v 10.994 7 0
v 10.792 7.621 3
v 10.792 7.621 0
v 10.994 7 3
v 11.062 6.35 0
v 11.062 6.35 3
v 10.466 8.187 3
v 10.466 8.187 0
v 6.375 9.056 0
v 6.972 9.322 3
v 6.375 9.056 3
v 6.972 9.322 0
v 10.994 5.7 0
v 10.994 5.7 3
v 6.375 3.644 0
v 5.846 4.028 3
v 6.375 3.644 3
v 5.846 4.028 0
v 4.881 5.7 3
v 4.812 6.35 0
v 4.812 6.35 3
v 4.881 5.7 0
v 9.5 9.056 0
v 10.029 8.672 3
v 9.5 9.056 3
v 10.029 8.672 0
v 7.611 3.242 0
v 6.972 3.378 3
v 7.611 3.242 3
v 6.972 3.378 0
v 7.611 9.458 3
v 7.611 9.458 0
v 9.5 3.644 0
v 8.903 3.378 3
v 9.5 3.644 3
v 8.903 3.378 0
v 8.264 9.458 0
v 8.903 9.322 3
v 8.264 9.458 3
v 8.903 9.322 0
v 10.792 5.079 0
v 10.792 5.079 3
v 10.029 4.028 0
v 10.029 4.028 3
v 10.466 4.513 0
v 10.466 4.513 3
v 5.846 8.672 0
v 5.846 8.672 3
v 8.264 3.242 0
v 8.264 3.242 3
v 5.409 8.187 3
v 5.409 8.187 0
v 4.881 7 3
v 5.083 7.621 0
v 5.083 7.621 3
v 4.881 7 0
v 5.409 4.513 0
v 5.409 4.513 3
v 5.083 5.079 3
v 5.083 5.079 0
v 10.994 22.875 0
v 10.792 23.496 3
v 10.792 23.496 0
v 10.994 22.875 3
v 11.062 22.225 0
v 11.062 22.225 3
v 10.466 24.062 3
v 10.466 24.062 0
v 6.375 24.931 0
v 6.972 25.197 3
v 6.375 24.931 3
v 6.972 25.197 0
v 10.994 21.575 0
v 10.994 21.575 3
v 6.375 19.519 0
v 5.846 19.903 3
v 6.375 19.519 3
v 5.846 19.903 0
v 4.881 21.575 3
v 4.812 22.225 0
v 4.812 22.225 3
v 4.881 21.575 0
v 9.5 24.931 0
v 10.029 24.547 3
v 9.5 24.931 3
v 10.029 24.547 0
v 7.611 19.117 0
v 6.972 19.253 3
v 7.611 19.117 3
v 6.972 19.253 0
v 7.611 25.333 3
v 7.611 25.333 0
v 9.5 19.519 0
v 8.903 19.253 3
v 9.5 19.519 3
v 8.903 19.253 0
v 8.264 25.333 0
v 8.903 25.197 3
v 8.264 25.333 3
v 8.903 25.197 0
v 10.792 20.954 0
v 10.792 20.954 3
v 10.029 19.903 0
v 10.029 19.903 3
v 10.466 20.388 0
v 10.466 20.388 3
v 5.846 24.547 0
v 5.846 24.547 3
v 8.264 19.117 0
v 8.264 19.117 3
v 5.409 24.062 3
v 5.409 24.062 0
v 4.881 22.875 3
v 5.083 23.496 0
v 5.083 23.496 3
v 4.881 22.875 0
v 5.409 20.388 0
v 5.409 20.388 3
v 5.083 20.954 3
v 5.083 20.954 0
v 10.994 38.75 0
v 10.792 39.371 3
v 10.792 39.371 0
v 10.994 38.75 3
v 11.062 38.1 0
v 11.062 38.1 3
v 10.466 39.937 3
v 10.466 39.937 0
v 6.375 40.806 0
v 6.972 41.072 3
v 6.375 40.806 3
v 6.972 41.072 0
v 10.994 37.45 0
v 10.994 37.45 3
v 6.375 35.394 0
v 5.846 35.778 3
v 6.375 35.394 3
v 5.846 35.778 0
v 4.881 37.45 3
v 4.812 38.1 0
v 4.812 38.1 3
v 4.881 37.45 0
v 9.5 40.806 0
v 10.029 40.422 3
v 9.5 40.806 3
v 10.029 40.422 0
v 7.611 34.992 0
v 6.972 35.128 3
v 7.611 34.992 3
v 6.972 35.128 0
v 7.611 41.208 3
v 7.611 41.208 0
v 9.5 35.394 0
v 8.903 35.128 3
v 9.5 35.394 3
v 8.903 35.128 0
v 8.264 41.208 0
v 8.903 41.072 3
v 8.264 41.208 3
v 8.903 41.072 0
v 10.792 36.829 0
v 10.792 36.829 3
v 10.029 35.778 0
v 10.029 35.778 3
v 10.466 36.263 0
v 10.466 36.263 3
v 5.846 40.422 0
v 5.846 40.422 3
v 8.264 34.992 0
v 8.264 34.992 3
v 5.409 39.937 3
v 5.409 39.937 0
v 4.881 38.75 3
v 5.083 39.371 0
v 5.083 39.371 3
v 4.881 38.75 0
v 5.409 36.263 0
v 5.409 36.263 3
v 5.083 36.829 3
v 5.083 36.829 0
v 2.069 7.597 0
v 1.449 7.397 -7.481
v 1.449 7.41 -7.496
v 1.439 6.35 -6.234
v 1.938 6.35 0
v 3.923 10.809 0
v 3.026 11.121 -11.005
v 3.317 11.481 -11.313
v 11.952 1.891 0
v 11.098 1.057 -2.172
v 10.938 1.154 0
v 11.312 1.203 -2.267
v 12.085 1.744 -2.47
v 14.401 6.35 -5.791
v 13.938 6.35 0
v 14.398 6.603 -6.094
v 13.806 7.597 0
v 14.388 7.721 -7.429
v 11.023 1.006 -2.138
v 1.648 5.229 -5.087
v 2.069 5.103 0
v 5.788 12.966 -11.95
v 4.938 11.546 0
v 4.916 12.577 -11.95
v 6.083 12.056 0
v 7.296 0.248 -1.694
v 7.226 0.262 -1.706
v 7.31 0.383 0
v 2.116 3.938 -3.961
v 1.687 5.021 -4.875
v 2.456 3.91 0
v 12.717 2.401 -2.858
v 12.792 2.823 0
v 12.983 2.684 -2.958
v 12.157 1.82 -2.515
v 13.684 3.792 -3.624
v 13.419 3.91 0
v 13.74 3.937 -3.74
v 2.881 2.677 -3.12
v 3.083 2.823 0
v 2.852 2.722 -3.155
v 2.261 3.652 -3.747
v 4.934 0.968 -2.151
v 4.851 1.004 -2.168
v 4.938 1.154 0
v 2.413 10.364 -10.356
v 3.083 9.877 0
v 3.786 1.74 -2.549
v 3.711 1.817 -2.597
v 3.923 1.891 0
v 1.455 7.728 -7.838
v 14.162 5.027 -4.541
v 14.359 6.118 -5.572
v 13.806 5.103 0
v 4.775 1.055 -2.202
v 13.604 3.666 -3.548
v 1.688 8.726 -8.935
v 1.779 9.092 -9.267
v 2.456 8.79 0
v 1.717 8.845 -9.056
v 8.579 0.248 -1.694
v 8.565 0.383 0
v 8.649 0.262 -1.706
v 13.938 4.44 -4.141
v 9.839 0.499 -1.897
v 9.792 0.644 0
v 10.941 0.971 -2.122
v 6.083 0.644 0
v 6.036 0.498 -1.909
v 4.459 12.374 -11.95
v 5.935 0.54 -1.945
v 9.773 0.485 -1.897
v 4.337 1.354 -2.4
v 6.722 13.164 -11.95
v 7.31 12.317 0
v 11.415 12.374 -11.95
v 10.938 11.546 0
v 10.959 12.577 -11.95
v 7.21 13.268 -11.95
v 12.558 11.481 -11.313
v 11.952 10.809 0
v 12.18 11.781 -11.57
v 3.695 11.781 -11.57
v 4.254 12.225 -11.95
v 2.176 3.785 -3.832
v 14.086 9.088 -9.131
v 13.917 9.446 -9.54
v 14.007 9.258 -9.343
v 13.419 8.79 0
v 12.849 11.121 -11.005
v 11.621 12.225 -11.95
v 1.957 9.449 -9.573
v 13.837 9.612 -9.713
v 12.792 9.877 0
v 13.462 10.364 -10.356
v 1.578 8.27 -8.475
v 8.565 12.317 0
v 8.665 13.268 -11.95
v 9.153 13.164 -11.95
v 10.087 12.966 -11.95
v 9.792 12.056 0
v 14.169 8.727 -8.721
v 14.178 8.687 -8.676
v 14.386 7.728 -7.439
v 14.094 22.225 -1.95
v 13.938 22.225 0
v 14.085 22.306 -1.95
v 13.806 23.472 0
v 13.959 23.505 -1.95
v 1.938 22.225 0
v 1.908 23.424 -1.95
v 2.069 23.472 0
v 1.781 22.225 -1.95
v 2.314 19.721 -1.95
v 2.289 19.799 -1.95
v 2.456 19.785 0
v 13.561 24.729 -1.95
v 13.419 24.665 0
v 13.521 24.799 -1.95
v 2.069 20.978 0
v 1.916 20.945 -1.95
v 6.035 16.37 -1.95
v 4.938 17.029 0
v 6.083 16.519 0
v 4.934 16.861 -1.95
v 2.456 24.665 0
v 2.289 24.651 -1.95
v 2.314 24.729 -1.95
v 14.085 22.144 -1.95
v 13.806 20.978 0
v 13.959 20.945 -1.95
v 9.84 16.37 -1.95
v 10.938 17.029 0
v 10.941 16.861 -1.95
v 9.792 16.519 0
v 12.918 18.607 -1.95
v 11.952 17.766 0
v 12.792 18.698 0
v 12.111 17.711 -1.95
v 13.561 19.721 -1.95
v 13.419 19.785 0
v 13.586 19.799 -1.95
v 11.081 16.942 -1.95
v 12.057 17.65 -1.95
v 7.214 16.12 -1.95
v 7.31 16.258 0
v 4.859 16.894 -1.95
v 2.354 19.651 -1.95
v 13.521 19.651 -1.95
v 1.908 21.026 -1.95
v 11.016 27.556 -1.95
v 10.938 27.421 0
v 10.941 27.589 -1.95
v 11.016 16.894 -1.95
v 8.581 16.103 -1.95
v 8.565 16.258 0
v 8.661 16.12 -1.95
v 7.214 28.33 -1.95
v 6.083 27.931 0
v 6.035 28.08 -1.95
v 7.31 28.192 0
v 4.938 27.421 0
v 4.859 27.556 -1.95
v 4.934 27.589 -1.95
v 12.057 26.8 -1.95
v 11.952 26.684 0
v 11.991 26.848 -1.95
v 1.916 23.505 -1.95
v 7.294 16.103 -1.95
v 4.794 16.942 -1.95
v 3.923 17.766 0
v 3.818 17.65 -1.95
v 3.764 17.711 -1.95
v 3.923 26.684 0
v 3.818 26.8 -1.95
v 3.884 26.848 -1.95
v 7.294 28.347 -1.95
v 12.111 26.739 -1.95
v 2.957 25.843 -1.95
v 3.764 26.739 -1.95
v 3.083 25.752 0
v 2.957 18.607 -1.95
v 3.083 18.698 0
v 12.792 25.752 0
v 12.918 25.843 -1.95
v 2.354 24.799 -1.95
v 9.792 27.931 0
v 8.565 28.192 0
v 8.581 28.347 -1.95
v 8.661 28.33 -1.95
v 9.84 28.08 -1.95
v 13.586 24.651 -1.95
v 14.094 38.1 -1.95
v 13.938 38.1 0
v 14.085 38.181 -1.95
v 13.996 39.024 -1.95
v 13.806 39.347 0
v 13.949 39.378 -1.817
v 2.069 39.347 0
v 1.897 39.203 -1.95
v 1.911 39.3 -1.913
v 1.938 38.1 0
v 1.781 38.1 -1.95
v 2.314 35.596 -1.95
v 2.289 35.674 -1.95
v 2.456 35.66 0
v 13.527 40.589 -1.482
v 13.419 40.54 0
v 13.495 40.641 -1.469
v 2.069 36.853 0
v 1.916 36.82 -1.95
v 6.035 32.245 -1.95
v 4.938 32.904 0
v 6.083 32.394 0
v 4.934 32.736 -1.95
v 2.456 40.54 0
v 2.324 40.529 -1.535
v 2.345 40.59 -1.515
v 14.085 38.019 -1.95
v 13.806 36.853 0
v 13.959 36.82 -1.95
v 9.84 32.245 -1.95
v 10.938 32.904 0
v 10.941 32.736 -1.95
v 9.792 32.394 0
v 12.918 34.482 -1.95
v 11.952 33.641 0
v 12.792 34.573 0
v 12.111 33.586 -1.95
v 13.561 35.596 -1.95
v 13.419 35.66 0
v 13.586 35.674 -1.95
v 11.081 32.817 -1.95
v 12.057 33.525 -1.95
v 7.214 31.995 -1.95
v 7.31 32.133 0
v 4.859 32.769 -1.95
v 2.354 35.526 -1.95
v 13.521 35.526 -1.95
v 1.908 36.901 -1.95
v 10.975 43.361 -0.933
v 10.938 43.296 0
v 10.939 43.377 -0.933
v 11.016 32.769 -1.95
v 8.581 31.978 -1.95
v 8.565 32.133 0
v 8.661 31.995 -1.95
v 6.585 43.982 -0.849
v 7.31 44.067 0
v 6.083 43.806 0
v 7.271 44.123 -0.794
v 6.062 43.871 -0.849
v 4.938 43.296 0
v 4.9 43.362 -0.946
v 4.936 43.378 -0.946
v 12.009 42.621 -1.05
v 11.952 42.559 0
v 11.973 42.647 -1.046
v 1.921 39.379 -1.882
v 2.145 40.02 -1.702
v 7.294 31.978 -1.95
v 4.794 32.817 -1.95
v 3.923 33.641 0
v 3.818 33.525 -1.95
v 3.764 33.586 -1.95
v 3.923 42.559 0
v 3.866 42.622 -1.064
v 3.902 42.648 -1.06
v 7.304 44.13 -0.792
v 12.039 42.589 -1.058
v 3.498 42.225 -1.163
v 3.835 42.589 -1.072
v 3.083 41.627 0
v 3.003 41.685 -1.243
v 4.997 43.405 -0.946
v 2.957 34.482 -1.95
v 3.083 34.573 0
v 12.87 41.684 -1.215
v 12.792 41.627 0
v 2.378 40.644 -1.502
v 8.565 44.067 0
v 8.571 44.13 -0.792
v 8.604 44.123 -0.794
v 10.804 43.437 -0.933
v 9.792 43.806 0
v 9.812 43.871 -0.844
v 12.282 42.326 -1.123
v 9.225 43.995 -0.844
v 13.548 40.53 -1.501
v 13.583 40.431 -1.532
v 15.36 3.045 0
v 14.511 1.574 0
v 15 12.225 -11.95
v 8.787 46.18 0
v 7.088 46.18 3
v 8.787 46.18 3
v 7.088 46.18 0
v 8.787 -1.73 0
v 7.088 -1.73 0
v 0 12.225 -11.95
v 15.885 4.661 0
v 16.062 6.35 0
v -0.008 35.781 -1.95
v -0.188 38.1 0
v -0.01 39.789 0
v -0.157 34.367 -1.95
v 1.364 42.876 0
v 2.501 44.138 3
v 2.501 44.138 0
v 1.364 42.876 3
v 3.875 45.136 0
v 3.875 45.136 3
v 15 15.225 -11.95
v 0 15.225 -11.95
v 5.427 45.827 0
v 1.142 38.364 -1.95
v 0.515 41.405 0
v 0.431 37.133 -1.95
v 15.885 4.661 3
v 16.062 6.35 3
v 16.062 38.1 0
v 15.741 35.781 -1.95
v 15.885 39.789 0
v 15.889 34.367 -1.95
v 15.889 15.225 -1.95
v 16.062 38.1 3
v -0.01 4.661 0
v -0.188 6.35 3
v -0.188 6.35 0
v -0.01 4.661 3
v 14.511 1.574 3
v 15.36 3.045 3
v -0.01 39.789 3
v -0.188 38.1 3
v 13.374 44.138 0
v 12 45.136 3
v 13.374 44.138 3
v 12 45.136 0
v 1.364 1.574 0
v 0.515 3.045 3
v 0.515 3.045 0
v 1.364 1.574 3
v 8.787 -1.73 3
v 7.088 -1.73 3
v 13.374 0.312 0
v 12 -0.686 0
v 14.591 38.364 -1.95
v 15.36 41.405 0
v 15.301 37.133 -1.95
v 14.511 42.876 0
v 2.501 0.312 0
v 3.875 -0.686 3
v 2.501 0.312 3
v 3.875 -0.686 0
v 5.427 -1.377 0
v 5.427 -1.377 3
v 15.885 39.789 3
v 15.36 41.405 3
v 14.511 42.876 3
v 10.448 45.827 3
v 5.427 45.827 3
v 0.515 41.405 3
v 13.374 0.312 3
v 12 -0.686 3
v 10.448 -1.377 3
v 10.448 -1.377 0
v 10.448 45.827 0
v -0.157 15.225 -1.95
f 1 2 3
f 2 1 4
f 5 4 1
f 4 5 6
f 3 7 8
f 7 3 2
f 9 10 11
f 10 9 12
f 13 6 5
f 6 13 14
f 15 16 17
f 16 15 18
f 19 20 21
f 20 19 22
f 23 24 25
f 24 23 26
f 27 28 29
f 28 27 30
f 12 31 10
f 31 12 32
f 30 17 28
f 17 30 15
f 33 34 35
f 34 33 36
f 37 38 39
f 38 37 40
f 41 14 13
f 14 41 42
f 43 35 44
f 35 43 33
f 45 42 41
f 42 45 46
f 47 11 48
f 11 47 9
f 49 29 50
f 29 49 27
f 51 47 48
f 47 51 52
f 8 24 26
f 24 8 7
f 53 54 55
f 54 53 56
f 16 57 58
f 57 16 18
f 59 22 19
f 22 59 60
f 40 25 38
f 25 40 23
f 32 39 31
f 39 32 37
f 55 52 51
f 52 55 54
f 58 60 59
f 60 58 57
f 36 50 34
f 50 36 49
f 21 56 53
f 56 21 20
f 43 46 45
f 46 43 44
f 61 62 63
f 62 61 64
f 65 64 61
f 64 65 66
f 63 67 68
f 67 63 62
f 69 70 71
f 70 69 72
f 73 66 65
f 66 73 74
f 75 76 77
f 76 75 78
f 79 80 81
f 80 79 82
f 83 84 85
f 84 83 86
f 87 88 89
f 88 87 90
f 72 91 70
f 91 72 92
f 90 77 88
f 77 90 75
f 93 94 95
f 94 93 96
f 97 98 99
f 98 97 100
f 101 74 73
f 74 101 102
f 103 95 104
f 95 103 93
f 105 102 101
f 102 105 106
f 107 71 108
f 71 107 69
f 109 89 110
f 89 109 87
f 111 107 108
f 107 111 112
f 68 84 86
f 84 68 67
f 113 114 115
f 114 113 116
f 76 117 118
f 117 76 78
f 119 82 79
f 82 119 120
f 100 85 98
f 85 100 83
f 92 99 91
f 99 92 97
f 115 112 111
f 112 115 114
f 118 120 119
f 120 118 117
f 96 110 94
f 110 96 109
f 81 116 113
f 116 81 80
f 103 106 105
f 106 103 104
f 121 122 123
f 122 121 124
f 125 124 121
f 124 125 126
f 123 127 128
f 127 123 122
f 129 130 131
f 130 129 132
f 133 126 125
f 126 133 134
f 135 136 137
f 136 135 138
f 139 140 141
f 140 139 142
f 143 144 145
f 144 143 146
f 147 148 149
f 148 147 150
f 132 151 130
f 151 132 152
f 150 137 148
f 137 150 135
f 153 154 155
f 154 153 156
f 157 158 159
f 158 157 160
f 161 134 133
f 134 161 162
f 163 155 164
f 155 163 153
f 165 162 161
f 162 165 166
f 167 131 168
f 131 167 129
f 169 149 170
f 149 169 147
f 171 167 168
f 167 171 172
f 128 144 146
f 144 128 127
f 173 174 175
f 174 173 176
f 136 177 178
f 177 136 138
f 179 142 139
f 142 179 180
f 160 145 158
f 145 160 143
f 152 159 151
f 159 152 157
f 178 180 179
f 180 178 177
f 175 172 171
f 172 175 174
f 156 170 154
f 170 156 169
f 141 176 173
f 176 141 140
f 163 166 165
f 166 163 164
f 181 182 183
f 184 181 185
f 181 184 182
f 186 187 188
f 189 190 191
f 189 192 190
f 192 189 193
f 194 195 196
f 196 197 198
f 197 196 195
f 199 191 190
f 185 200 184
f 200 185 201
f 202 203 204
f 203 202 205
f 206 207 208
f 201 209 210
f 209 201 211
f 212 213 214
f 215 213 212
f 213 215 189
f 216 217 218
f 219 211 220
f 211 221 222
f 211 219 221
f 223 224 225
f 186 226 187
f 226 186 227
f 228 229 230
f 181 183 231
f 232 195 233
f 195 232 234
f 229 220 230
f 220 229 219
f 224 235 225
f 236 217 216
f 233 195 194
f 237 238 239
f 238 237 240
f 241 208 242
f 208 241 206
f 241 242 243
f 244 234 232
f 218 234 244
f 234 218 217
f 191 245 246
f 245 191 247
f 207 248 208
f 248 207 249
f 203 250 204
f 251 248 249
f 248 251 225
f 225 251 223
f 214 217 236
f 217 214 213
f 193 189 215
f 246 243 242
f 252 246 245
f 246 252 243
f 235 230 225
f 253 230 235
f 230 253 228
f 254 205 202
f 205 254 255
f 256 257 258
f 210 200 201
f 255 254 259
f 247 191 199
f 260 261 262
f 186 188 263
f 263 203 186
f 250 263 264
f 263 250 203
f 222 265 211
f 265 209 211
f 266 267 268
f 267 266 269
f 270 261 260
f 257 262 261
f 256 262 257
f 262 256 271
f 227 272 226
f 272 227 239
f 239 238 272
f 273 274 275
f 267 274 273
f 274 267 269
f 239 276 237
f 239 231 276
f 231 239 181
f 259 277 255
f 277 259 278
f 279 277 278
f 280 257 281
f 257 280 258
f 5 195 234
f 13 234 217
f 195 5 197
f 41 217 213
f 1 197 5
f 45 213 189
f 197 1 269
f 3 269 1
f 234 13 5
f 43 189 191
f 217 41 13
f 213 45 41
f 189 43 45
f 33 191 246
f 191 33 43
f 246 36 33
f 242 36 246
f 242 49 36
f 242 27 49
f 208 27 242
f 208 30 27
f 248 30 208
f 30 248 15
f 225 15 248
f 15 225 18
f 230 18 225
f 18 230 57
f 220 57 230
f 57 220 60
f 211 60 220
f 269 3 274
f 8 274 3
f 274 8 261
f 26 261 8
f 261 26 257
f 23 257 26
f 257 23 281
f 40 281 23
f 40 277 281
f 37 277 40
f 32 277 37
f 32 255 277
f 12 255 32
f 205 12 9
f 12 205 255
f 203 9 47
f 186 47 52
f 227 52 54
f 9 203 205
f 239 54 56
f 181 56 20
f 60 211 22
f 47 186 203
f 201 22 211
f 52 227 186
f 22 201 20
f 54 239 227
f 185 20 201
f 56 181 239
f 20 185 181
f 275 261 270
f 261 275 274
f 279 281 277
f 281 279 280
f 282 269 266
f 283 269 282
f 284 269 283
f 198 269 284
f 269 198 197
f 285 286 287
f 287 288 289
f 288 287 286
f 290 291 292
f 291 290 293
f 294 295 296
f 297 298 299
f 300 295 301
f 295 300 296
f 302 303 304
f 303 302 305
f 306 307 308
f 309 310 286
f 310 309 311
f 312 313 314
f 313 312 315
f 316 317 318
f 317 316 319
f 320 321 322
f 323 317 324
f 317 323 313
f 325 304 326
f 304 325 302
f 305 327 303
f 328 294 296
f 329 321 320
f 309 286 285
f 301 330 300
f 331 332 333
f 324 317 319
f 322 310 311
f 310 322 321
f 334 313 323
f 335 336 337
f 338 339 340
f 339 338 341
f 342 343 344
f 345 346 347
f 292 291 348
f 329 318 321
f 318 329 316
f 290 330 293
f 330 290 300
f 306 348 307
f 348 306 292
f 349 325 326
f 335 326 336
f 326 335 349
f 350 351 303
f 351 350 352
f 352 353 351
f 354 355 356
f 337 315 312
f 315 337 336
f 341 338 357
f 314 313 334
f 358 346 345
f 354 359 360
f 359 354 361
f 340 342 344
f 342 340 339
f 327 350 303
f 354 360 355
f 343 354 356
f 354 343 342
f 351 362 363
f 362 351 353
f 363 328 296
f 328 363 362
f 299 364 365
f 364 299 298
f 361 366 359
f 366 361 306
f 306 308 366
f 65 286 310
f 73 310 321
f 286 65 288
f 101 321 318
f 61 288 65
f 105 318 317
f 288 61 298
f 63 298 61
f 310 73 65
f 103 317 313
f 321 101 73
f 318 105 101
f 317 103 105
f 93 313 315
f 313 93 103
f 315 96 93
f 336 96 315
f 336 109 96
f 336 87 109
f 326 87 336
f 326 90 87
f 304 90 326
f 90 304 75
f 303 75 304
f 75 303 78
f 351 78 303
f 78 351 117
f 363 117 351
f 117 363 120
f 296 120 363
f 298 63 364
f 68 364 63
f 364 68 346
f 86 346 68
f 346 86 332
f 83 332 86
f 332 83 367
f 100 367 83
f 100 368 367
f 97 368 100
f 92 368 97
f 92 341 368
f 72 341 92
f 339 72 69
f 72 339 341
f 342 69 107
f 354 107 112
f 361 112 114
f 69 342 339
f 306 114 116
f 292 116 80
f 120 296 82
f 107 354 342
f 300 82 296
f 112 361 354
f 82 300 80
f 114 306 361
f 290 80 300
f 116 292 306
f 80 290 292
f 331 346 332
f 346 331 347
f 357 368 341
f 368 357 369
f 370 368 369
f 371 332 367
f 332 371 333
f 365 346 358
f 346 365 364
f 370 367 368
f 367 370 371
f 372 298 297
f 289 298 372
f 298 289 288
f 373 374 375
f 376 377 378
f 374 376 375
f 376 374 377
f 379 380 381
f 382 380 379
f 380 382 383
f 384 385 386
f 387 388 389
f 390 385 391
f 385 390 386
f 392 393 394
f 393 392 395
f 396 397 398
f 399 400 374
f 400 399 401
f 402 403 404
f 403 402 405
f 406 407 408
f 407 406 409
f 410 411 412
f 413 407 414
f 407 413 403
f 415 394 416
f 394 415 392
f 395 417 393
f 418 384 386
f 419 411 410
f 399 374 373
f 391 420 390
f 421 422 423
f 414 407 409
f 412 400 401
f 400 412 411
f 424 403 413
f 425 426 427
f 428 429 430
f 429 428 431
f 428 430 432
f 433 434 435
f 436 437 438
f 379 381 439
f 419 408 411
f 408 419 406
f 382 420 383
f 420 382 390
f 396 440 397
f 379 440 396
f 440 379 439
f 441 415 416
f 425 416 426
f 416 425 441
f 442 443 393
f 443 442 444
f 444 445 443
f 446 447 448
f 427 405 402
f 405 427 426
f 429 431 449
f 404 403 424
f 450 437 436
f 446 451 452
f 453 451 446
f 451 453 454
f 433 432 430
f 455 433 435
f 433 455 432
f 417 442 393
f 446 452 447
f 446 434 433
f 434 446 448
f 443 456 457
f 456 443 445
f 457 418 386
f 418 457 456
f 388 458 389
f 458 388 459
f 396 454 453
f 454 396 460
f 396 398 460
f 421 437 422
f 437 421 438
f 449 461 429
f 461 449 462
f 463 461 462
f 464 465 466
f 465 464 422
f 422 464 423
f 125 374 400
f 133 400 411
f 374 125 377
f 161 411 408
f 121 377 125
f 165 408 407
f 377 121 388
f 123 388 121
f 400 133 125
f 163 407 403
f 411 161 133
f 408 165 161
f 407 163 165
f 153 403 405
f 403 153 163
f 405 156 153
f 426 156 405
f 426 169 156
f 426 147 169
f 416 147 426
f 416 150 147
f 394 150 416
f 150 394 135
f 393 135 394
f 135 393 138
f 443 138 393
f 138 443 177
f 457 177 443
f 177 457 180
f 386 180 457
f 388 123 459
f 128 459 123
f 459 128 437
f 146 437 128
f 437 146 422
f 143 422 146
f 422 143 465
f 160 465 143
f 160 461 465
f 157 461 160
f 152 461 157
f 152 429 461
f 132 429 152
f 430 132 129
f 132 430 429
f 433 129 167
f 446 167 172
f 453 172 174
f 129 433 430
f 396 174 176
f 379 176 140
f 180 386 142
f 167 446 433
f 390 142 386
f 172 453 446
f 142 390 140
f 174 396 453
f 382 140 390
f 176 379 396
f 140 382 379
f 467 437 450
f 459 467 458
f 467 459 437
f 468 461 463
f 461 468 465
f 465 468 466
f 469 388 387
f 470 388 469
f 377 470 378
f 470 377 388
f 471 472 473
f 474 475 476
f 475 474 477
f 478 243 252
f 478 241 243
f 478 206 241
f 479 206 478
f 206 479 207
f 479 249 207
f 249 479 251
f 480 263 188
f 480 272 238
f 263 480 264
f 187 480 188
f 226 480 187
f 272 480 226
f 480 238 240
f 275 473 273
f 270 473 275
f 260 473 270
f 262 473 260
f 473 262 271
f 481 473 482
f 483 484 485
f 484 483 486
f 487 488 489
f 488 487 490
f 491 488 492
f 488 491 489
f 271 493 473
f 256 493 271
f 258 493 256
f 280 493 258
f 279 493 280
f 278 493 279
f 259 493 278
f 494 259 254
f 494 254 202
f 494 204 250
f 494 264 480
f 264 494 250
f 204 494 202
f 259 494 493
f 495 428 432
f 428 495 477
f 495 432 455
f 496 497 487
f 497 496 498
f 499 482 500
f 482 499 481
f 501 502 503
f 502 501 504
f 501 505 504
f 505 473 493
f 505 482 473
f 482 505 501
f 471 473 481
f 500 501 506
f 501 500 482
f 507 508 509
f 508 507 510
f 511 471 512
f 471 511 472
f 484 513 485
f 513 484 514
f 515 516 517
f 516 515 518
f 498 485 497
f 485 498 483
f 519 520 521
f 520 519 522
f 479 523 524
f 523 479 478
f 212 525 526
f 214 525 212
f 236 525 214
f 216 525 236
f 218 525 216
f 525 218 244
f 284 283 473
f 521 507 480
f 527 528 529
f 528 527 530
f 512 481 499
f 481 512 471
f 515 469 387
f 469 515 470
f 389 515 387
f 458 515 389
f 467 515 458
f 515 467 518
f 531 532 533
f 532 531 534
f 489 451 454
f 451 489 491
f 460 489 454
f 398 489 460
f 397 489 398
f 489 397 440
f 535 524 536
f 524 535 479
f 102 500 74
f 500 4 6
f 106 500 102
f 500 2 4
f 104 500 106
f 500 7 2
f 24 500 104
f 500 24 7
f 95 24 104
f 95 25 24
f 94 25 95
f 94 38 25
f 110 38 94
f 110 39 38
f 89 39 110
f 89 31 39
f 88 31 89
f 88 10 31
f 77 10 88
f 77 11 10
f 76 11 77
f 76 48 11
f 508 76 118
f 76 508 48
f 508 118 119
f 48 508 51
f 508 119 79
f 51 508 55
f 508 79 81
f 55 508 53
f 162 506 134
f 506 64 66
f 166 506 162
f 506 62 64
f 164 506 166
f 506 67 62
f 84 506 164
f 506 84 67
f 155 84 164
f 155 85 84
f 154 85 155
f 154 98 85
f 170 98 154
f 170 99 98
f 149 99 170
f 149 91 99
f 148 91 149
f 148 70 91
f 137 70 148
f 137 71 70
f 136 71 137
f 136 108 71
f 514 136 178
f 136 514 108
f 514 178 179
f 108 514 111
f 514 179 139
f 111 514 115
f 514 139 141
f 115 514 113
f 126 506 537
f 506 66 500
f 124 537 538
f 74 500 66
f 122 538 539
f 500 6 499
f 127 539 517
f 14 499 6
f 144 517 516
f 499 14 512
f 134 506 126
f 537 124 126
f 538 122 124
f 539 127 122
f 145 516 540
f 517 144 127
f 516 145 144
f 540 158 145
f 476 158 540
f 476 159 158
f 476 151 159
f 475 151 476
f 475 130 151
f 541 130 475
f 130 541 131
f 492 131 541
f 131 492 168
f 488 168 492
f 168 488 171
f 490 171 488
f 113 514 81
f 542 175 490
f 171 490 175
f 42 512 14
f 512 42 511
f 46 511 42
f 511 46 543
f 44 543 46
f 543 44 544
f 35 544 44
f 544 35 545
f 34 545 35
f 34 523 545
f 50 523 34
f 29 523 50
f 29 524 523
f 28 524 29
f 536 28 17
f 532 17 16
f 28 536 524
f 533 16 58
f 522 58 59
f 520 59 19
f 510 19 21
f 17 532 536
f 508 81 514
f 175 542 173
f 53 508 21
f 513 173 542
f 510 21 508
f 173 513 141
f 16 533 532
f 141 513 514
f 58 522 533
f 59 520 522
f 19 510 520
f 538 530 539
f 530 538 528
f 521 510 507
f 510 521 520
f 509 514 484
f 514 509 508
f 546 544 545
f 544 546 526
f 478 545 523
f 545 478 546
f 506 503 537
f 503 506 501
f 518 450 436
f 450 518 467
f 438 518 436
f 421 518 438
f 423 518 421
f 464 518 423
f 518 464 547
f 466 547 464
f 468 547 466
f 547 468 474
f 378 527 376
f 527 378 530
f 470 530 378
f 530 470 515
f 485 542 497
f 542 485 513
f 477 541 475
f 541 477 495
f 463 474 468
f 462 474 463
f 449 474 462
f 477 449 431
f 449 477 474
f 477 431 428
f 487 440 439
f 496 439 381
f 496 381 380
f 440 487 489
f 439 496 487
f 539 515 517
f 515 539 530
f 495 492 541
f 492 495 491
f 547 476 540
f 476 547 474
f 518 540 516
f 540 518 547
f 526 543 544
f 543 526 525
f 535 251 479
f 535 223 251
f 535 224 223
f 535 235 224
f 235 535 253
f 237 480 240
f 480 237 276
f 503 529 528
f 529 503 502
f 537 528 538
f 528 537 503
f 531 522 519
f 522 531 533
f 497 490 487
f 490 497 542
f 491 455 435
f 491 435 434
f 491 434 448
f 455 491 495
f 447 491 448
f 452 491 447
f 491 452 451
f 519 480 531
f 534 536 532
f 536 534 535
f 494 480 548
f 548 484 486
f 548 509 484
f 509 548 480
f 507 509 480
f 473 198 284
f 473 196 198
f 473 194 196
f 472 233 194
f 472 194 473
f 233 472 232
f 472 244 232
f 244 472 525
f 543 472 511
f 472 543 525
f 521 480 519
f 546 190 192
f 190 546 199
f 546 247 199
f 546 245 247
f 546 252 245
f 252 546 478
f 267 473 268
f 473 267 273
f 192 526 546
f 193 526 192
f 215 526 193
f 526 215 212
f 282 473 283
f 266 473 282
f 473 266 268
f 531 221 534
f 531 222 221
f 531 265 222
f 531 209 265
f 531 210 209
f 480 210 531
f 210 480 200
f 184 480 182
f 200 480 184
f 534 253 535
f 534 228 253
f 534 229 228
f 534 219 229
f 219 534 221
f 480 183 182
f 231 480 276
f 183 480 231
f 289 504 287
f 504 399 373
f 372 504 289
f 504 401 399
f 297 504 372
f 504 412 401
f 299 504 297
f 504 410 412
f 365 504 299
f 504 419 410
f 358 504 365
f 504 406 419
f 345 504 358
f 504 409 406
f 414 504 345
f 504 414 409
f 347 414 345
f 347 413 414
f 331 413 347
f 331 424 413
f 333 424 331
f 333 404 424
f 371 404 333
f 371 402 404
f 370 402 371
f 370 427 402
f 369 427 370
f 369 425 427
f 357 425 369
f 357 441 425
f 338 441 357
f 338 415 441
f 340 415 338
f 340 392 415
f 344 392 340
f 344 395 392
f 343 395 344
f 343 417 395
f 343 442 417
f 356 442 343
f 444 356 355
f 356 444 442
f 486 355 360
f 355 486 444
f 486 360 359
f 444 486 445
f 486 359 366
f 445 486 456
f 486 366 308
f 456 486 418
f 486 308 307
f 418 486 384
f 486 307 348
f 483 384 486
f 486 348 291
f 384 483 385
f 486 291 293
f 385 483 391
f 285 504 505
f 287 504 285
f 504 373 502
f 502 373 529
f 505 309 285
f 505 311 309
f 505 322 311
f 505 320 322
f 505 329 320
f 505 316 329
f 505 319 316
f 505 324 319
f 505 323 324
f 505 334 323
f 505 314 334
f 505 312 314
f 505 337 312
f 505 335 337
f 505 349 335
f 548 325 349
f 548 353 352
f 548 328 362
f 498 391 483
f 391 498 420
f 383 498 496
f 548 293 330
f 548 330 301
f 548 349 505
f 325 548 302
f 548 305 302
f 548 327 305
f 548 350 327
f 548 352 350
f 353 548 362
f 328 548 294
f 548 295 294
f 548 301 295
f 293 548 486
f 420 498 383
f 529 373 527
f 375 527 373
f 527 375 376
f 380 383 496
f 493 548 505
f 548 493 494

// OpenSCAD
///< Object definition

/*
  Rack Unit overview
  https://en.wikipedia.org/wiki/Rack_unit

  Panel Height:
  1 Rack unit is 1+3/4" ( 44.45mm )
  This less the spacing adjustment of 1/32" ( 0.794mm )

  If n is number of rack units, the ideal formula for panel height is:
  h = ( 1.75n − 0.031) for calculating in inches, and
  h = (44.45n − 0.794) for calculating in millimetres.

  Mounting Holes:
  Threaded holes conform to M6, #12-24 or #10-32

  Width of rail face:
  0.625" ( 15.875mm )

  From zero (origin) the first hole is 0.25" ( 6.35mm ) and  0.5" ( 12.7mm )
  between center points u-to-u.

  From lower mount to center mount 0.625" ( 15.875mm ) and this repeats to the
  top mounting hole.
  https://en.wikipedia.org/wiki/File:Server_rack_rail_dimensions.svg
  */

///< Functions
function panel_height_inch( n = 1 ) = (  1.75 * n - 0.031 );
function panel_height_mm  ( n = 1 ) = ( 44.45 * n - 0.794 );

///< Constants and Parameters
$fn=30;
rail_face_width    = 15.875;
mount_spacing      = 15.875;
hole_1_center      = 6.35;
hole_2_center      = hole_1_center + mount_spacing;
hole_3_center      = hole_2_center + mount_spacing;
hole_x             = rail_face_width/2;
hole_d             = 6.25; ///< M6 screw
hole_r             = hole_d/2;
plate_h            = 3;

mount_points =
     [
     [ hole_x, hole_1_center, 0 ],
     [ hole_x, hole_2_center, 0 ],
     [ hole_x, hole_3_center, 0 ],
     ];


///< Modules
module mounts( r = 1, h = 1, points, rot = [0,0,0] ){
  for( p = points ){
    translate( p ) rotate( rot )cylinder( r = r, h=h);
  }
}


module chamfer( d1, d2, h, points, rot = [0,0,0] ){
  for( p = points ){
    translate( p ) rotate( rot )cylinder(d1=d1, d2=d2, h=h);
  }
}

module rack_mount( r, h , p, pad = 1 ){
     difference(){
          hull() mounts( r = r+pad, h = h, points = p );
          mounts( r = r, h = h, points = p );
          }
}

module mounting_sys( r, plate_thickness, points, shelf_points, shelf_dem, chmf, pad ){
    difference(){
        hull(){
            rotate([0,90,0])
                translate( shelf_points )cube( shelf_dem );
            color("cyan")
                rack_mount( r, plate_thickness, points, pad = pad );
        }
        mirror([0,0,1])
            translate([0,0,-50]) /// Infinite
                mounts( r, plate_thickness+100, points );
        mirror([0,0,1])
            translate( [ 0, 0, 0])
                color("pink")chamfer( chmf[0],
                                      chmf[1],
                                      50,    /// Infinite
                                      points );       
    }
    
}

module shelf_1u_mount( r, plate_thickness, points, shelf_points, shelf_dem, chmf = [ 12, 20 ], pad = 5 ){
    difference(){

        mounting_sys( r, plate_thickness, points, shelf_points, shelf_dem, chmf, pad );
        carve_out = [
                     shelf_points[ 0 ],
                     shelf_points[ 1 ]+plate_thickness,
                     shelf_points[ 2 ]-1
                     ];
        upper_extension = panel_height_mm( 1 );
        rotate([0,90,0])
            
            translate( carve_out )color("cyan") cube( [ shelf_dem[2],
                                                        shelf_dem[1]+upper_extension,
                                                        shelf_dem[2]+2 ]);
    }
}

///< Build object
shelf_1u_mount(
               r               = hole_r,
               plate_thickness = plate_h,
               points          = mount_points,
               shelf_points    = [ plate_h*0.65, hole_2_center-10, 0 ],
               shelf_dem       = [ 10, plate_h, 15 ]
               );
